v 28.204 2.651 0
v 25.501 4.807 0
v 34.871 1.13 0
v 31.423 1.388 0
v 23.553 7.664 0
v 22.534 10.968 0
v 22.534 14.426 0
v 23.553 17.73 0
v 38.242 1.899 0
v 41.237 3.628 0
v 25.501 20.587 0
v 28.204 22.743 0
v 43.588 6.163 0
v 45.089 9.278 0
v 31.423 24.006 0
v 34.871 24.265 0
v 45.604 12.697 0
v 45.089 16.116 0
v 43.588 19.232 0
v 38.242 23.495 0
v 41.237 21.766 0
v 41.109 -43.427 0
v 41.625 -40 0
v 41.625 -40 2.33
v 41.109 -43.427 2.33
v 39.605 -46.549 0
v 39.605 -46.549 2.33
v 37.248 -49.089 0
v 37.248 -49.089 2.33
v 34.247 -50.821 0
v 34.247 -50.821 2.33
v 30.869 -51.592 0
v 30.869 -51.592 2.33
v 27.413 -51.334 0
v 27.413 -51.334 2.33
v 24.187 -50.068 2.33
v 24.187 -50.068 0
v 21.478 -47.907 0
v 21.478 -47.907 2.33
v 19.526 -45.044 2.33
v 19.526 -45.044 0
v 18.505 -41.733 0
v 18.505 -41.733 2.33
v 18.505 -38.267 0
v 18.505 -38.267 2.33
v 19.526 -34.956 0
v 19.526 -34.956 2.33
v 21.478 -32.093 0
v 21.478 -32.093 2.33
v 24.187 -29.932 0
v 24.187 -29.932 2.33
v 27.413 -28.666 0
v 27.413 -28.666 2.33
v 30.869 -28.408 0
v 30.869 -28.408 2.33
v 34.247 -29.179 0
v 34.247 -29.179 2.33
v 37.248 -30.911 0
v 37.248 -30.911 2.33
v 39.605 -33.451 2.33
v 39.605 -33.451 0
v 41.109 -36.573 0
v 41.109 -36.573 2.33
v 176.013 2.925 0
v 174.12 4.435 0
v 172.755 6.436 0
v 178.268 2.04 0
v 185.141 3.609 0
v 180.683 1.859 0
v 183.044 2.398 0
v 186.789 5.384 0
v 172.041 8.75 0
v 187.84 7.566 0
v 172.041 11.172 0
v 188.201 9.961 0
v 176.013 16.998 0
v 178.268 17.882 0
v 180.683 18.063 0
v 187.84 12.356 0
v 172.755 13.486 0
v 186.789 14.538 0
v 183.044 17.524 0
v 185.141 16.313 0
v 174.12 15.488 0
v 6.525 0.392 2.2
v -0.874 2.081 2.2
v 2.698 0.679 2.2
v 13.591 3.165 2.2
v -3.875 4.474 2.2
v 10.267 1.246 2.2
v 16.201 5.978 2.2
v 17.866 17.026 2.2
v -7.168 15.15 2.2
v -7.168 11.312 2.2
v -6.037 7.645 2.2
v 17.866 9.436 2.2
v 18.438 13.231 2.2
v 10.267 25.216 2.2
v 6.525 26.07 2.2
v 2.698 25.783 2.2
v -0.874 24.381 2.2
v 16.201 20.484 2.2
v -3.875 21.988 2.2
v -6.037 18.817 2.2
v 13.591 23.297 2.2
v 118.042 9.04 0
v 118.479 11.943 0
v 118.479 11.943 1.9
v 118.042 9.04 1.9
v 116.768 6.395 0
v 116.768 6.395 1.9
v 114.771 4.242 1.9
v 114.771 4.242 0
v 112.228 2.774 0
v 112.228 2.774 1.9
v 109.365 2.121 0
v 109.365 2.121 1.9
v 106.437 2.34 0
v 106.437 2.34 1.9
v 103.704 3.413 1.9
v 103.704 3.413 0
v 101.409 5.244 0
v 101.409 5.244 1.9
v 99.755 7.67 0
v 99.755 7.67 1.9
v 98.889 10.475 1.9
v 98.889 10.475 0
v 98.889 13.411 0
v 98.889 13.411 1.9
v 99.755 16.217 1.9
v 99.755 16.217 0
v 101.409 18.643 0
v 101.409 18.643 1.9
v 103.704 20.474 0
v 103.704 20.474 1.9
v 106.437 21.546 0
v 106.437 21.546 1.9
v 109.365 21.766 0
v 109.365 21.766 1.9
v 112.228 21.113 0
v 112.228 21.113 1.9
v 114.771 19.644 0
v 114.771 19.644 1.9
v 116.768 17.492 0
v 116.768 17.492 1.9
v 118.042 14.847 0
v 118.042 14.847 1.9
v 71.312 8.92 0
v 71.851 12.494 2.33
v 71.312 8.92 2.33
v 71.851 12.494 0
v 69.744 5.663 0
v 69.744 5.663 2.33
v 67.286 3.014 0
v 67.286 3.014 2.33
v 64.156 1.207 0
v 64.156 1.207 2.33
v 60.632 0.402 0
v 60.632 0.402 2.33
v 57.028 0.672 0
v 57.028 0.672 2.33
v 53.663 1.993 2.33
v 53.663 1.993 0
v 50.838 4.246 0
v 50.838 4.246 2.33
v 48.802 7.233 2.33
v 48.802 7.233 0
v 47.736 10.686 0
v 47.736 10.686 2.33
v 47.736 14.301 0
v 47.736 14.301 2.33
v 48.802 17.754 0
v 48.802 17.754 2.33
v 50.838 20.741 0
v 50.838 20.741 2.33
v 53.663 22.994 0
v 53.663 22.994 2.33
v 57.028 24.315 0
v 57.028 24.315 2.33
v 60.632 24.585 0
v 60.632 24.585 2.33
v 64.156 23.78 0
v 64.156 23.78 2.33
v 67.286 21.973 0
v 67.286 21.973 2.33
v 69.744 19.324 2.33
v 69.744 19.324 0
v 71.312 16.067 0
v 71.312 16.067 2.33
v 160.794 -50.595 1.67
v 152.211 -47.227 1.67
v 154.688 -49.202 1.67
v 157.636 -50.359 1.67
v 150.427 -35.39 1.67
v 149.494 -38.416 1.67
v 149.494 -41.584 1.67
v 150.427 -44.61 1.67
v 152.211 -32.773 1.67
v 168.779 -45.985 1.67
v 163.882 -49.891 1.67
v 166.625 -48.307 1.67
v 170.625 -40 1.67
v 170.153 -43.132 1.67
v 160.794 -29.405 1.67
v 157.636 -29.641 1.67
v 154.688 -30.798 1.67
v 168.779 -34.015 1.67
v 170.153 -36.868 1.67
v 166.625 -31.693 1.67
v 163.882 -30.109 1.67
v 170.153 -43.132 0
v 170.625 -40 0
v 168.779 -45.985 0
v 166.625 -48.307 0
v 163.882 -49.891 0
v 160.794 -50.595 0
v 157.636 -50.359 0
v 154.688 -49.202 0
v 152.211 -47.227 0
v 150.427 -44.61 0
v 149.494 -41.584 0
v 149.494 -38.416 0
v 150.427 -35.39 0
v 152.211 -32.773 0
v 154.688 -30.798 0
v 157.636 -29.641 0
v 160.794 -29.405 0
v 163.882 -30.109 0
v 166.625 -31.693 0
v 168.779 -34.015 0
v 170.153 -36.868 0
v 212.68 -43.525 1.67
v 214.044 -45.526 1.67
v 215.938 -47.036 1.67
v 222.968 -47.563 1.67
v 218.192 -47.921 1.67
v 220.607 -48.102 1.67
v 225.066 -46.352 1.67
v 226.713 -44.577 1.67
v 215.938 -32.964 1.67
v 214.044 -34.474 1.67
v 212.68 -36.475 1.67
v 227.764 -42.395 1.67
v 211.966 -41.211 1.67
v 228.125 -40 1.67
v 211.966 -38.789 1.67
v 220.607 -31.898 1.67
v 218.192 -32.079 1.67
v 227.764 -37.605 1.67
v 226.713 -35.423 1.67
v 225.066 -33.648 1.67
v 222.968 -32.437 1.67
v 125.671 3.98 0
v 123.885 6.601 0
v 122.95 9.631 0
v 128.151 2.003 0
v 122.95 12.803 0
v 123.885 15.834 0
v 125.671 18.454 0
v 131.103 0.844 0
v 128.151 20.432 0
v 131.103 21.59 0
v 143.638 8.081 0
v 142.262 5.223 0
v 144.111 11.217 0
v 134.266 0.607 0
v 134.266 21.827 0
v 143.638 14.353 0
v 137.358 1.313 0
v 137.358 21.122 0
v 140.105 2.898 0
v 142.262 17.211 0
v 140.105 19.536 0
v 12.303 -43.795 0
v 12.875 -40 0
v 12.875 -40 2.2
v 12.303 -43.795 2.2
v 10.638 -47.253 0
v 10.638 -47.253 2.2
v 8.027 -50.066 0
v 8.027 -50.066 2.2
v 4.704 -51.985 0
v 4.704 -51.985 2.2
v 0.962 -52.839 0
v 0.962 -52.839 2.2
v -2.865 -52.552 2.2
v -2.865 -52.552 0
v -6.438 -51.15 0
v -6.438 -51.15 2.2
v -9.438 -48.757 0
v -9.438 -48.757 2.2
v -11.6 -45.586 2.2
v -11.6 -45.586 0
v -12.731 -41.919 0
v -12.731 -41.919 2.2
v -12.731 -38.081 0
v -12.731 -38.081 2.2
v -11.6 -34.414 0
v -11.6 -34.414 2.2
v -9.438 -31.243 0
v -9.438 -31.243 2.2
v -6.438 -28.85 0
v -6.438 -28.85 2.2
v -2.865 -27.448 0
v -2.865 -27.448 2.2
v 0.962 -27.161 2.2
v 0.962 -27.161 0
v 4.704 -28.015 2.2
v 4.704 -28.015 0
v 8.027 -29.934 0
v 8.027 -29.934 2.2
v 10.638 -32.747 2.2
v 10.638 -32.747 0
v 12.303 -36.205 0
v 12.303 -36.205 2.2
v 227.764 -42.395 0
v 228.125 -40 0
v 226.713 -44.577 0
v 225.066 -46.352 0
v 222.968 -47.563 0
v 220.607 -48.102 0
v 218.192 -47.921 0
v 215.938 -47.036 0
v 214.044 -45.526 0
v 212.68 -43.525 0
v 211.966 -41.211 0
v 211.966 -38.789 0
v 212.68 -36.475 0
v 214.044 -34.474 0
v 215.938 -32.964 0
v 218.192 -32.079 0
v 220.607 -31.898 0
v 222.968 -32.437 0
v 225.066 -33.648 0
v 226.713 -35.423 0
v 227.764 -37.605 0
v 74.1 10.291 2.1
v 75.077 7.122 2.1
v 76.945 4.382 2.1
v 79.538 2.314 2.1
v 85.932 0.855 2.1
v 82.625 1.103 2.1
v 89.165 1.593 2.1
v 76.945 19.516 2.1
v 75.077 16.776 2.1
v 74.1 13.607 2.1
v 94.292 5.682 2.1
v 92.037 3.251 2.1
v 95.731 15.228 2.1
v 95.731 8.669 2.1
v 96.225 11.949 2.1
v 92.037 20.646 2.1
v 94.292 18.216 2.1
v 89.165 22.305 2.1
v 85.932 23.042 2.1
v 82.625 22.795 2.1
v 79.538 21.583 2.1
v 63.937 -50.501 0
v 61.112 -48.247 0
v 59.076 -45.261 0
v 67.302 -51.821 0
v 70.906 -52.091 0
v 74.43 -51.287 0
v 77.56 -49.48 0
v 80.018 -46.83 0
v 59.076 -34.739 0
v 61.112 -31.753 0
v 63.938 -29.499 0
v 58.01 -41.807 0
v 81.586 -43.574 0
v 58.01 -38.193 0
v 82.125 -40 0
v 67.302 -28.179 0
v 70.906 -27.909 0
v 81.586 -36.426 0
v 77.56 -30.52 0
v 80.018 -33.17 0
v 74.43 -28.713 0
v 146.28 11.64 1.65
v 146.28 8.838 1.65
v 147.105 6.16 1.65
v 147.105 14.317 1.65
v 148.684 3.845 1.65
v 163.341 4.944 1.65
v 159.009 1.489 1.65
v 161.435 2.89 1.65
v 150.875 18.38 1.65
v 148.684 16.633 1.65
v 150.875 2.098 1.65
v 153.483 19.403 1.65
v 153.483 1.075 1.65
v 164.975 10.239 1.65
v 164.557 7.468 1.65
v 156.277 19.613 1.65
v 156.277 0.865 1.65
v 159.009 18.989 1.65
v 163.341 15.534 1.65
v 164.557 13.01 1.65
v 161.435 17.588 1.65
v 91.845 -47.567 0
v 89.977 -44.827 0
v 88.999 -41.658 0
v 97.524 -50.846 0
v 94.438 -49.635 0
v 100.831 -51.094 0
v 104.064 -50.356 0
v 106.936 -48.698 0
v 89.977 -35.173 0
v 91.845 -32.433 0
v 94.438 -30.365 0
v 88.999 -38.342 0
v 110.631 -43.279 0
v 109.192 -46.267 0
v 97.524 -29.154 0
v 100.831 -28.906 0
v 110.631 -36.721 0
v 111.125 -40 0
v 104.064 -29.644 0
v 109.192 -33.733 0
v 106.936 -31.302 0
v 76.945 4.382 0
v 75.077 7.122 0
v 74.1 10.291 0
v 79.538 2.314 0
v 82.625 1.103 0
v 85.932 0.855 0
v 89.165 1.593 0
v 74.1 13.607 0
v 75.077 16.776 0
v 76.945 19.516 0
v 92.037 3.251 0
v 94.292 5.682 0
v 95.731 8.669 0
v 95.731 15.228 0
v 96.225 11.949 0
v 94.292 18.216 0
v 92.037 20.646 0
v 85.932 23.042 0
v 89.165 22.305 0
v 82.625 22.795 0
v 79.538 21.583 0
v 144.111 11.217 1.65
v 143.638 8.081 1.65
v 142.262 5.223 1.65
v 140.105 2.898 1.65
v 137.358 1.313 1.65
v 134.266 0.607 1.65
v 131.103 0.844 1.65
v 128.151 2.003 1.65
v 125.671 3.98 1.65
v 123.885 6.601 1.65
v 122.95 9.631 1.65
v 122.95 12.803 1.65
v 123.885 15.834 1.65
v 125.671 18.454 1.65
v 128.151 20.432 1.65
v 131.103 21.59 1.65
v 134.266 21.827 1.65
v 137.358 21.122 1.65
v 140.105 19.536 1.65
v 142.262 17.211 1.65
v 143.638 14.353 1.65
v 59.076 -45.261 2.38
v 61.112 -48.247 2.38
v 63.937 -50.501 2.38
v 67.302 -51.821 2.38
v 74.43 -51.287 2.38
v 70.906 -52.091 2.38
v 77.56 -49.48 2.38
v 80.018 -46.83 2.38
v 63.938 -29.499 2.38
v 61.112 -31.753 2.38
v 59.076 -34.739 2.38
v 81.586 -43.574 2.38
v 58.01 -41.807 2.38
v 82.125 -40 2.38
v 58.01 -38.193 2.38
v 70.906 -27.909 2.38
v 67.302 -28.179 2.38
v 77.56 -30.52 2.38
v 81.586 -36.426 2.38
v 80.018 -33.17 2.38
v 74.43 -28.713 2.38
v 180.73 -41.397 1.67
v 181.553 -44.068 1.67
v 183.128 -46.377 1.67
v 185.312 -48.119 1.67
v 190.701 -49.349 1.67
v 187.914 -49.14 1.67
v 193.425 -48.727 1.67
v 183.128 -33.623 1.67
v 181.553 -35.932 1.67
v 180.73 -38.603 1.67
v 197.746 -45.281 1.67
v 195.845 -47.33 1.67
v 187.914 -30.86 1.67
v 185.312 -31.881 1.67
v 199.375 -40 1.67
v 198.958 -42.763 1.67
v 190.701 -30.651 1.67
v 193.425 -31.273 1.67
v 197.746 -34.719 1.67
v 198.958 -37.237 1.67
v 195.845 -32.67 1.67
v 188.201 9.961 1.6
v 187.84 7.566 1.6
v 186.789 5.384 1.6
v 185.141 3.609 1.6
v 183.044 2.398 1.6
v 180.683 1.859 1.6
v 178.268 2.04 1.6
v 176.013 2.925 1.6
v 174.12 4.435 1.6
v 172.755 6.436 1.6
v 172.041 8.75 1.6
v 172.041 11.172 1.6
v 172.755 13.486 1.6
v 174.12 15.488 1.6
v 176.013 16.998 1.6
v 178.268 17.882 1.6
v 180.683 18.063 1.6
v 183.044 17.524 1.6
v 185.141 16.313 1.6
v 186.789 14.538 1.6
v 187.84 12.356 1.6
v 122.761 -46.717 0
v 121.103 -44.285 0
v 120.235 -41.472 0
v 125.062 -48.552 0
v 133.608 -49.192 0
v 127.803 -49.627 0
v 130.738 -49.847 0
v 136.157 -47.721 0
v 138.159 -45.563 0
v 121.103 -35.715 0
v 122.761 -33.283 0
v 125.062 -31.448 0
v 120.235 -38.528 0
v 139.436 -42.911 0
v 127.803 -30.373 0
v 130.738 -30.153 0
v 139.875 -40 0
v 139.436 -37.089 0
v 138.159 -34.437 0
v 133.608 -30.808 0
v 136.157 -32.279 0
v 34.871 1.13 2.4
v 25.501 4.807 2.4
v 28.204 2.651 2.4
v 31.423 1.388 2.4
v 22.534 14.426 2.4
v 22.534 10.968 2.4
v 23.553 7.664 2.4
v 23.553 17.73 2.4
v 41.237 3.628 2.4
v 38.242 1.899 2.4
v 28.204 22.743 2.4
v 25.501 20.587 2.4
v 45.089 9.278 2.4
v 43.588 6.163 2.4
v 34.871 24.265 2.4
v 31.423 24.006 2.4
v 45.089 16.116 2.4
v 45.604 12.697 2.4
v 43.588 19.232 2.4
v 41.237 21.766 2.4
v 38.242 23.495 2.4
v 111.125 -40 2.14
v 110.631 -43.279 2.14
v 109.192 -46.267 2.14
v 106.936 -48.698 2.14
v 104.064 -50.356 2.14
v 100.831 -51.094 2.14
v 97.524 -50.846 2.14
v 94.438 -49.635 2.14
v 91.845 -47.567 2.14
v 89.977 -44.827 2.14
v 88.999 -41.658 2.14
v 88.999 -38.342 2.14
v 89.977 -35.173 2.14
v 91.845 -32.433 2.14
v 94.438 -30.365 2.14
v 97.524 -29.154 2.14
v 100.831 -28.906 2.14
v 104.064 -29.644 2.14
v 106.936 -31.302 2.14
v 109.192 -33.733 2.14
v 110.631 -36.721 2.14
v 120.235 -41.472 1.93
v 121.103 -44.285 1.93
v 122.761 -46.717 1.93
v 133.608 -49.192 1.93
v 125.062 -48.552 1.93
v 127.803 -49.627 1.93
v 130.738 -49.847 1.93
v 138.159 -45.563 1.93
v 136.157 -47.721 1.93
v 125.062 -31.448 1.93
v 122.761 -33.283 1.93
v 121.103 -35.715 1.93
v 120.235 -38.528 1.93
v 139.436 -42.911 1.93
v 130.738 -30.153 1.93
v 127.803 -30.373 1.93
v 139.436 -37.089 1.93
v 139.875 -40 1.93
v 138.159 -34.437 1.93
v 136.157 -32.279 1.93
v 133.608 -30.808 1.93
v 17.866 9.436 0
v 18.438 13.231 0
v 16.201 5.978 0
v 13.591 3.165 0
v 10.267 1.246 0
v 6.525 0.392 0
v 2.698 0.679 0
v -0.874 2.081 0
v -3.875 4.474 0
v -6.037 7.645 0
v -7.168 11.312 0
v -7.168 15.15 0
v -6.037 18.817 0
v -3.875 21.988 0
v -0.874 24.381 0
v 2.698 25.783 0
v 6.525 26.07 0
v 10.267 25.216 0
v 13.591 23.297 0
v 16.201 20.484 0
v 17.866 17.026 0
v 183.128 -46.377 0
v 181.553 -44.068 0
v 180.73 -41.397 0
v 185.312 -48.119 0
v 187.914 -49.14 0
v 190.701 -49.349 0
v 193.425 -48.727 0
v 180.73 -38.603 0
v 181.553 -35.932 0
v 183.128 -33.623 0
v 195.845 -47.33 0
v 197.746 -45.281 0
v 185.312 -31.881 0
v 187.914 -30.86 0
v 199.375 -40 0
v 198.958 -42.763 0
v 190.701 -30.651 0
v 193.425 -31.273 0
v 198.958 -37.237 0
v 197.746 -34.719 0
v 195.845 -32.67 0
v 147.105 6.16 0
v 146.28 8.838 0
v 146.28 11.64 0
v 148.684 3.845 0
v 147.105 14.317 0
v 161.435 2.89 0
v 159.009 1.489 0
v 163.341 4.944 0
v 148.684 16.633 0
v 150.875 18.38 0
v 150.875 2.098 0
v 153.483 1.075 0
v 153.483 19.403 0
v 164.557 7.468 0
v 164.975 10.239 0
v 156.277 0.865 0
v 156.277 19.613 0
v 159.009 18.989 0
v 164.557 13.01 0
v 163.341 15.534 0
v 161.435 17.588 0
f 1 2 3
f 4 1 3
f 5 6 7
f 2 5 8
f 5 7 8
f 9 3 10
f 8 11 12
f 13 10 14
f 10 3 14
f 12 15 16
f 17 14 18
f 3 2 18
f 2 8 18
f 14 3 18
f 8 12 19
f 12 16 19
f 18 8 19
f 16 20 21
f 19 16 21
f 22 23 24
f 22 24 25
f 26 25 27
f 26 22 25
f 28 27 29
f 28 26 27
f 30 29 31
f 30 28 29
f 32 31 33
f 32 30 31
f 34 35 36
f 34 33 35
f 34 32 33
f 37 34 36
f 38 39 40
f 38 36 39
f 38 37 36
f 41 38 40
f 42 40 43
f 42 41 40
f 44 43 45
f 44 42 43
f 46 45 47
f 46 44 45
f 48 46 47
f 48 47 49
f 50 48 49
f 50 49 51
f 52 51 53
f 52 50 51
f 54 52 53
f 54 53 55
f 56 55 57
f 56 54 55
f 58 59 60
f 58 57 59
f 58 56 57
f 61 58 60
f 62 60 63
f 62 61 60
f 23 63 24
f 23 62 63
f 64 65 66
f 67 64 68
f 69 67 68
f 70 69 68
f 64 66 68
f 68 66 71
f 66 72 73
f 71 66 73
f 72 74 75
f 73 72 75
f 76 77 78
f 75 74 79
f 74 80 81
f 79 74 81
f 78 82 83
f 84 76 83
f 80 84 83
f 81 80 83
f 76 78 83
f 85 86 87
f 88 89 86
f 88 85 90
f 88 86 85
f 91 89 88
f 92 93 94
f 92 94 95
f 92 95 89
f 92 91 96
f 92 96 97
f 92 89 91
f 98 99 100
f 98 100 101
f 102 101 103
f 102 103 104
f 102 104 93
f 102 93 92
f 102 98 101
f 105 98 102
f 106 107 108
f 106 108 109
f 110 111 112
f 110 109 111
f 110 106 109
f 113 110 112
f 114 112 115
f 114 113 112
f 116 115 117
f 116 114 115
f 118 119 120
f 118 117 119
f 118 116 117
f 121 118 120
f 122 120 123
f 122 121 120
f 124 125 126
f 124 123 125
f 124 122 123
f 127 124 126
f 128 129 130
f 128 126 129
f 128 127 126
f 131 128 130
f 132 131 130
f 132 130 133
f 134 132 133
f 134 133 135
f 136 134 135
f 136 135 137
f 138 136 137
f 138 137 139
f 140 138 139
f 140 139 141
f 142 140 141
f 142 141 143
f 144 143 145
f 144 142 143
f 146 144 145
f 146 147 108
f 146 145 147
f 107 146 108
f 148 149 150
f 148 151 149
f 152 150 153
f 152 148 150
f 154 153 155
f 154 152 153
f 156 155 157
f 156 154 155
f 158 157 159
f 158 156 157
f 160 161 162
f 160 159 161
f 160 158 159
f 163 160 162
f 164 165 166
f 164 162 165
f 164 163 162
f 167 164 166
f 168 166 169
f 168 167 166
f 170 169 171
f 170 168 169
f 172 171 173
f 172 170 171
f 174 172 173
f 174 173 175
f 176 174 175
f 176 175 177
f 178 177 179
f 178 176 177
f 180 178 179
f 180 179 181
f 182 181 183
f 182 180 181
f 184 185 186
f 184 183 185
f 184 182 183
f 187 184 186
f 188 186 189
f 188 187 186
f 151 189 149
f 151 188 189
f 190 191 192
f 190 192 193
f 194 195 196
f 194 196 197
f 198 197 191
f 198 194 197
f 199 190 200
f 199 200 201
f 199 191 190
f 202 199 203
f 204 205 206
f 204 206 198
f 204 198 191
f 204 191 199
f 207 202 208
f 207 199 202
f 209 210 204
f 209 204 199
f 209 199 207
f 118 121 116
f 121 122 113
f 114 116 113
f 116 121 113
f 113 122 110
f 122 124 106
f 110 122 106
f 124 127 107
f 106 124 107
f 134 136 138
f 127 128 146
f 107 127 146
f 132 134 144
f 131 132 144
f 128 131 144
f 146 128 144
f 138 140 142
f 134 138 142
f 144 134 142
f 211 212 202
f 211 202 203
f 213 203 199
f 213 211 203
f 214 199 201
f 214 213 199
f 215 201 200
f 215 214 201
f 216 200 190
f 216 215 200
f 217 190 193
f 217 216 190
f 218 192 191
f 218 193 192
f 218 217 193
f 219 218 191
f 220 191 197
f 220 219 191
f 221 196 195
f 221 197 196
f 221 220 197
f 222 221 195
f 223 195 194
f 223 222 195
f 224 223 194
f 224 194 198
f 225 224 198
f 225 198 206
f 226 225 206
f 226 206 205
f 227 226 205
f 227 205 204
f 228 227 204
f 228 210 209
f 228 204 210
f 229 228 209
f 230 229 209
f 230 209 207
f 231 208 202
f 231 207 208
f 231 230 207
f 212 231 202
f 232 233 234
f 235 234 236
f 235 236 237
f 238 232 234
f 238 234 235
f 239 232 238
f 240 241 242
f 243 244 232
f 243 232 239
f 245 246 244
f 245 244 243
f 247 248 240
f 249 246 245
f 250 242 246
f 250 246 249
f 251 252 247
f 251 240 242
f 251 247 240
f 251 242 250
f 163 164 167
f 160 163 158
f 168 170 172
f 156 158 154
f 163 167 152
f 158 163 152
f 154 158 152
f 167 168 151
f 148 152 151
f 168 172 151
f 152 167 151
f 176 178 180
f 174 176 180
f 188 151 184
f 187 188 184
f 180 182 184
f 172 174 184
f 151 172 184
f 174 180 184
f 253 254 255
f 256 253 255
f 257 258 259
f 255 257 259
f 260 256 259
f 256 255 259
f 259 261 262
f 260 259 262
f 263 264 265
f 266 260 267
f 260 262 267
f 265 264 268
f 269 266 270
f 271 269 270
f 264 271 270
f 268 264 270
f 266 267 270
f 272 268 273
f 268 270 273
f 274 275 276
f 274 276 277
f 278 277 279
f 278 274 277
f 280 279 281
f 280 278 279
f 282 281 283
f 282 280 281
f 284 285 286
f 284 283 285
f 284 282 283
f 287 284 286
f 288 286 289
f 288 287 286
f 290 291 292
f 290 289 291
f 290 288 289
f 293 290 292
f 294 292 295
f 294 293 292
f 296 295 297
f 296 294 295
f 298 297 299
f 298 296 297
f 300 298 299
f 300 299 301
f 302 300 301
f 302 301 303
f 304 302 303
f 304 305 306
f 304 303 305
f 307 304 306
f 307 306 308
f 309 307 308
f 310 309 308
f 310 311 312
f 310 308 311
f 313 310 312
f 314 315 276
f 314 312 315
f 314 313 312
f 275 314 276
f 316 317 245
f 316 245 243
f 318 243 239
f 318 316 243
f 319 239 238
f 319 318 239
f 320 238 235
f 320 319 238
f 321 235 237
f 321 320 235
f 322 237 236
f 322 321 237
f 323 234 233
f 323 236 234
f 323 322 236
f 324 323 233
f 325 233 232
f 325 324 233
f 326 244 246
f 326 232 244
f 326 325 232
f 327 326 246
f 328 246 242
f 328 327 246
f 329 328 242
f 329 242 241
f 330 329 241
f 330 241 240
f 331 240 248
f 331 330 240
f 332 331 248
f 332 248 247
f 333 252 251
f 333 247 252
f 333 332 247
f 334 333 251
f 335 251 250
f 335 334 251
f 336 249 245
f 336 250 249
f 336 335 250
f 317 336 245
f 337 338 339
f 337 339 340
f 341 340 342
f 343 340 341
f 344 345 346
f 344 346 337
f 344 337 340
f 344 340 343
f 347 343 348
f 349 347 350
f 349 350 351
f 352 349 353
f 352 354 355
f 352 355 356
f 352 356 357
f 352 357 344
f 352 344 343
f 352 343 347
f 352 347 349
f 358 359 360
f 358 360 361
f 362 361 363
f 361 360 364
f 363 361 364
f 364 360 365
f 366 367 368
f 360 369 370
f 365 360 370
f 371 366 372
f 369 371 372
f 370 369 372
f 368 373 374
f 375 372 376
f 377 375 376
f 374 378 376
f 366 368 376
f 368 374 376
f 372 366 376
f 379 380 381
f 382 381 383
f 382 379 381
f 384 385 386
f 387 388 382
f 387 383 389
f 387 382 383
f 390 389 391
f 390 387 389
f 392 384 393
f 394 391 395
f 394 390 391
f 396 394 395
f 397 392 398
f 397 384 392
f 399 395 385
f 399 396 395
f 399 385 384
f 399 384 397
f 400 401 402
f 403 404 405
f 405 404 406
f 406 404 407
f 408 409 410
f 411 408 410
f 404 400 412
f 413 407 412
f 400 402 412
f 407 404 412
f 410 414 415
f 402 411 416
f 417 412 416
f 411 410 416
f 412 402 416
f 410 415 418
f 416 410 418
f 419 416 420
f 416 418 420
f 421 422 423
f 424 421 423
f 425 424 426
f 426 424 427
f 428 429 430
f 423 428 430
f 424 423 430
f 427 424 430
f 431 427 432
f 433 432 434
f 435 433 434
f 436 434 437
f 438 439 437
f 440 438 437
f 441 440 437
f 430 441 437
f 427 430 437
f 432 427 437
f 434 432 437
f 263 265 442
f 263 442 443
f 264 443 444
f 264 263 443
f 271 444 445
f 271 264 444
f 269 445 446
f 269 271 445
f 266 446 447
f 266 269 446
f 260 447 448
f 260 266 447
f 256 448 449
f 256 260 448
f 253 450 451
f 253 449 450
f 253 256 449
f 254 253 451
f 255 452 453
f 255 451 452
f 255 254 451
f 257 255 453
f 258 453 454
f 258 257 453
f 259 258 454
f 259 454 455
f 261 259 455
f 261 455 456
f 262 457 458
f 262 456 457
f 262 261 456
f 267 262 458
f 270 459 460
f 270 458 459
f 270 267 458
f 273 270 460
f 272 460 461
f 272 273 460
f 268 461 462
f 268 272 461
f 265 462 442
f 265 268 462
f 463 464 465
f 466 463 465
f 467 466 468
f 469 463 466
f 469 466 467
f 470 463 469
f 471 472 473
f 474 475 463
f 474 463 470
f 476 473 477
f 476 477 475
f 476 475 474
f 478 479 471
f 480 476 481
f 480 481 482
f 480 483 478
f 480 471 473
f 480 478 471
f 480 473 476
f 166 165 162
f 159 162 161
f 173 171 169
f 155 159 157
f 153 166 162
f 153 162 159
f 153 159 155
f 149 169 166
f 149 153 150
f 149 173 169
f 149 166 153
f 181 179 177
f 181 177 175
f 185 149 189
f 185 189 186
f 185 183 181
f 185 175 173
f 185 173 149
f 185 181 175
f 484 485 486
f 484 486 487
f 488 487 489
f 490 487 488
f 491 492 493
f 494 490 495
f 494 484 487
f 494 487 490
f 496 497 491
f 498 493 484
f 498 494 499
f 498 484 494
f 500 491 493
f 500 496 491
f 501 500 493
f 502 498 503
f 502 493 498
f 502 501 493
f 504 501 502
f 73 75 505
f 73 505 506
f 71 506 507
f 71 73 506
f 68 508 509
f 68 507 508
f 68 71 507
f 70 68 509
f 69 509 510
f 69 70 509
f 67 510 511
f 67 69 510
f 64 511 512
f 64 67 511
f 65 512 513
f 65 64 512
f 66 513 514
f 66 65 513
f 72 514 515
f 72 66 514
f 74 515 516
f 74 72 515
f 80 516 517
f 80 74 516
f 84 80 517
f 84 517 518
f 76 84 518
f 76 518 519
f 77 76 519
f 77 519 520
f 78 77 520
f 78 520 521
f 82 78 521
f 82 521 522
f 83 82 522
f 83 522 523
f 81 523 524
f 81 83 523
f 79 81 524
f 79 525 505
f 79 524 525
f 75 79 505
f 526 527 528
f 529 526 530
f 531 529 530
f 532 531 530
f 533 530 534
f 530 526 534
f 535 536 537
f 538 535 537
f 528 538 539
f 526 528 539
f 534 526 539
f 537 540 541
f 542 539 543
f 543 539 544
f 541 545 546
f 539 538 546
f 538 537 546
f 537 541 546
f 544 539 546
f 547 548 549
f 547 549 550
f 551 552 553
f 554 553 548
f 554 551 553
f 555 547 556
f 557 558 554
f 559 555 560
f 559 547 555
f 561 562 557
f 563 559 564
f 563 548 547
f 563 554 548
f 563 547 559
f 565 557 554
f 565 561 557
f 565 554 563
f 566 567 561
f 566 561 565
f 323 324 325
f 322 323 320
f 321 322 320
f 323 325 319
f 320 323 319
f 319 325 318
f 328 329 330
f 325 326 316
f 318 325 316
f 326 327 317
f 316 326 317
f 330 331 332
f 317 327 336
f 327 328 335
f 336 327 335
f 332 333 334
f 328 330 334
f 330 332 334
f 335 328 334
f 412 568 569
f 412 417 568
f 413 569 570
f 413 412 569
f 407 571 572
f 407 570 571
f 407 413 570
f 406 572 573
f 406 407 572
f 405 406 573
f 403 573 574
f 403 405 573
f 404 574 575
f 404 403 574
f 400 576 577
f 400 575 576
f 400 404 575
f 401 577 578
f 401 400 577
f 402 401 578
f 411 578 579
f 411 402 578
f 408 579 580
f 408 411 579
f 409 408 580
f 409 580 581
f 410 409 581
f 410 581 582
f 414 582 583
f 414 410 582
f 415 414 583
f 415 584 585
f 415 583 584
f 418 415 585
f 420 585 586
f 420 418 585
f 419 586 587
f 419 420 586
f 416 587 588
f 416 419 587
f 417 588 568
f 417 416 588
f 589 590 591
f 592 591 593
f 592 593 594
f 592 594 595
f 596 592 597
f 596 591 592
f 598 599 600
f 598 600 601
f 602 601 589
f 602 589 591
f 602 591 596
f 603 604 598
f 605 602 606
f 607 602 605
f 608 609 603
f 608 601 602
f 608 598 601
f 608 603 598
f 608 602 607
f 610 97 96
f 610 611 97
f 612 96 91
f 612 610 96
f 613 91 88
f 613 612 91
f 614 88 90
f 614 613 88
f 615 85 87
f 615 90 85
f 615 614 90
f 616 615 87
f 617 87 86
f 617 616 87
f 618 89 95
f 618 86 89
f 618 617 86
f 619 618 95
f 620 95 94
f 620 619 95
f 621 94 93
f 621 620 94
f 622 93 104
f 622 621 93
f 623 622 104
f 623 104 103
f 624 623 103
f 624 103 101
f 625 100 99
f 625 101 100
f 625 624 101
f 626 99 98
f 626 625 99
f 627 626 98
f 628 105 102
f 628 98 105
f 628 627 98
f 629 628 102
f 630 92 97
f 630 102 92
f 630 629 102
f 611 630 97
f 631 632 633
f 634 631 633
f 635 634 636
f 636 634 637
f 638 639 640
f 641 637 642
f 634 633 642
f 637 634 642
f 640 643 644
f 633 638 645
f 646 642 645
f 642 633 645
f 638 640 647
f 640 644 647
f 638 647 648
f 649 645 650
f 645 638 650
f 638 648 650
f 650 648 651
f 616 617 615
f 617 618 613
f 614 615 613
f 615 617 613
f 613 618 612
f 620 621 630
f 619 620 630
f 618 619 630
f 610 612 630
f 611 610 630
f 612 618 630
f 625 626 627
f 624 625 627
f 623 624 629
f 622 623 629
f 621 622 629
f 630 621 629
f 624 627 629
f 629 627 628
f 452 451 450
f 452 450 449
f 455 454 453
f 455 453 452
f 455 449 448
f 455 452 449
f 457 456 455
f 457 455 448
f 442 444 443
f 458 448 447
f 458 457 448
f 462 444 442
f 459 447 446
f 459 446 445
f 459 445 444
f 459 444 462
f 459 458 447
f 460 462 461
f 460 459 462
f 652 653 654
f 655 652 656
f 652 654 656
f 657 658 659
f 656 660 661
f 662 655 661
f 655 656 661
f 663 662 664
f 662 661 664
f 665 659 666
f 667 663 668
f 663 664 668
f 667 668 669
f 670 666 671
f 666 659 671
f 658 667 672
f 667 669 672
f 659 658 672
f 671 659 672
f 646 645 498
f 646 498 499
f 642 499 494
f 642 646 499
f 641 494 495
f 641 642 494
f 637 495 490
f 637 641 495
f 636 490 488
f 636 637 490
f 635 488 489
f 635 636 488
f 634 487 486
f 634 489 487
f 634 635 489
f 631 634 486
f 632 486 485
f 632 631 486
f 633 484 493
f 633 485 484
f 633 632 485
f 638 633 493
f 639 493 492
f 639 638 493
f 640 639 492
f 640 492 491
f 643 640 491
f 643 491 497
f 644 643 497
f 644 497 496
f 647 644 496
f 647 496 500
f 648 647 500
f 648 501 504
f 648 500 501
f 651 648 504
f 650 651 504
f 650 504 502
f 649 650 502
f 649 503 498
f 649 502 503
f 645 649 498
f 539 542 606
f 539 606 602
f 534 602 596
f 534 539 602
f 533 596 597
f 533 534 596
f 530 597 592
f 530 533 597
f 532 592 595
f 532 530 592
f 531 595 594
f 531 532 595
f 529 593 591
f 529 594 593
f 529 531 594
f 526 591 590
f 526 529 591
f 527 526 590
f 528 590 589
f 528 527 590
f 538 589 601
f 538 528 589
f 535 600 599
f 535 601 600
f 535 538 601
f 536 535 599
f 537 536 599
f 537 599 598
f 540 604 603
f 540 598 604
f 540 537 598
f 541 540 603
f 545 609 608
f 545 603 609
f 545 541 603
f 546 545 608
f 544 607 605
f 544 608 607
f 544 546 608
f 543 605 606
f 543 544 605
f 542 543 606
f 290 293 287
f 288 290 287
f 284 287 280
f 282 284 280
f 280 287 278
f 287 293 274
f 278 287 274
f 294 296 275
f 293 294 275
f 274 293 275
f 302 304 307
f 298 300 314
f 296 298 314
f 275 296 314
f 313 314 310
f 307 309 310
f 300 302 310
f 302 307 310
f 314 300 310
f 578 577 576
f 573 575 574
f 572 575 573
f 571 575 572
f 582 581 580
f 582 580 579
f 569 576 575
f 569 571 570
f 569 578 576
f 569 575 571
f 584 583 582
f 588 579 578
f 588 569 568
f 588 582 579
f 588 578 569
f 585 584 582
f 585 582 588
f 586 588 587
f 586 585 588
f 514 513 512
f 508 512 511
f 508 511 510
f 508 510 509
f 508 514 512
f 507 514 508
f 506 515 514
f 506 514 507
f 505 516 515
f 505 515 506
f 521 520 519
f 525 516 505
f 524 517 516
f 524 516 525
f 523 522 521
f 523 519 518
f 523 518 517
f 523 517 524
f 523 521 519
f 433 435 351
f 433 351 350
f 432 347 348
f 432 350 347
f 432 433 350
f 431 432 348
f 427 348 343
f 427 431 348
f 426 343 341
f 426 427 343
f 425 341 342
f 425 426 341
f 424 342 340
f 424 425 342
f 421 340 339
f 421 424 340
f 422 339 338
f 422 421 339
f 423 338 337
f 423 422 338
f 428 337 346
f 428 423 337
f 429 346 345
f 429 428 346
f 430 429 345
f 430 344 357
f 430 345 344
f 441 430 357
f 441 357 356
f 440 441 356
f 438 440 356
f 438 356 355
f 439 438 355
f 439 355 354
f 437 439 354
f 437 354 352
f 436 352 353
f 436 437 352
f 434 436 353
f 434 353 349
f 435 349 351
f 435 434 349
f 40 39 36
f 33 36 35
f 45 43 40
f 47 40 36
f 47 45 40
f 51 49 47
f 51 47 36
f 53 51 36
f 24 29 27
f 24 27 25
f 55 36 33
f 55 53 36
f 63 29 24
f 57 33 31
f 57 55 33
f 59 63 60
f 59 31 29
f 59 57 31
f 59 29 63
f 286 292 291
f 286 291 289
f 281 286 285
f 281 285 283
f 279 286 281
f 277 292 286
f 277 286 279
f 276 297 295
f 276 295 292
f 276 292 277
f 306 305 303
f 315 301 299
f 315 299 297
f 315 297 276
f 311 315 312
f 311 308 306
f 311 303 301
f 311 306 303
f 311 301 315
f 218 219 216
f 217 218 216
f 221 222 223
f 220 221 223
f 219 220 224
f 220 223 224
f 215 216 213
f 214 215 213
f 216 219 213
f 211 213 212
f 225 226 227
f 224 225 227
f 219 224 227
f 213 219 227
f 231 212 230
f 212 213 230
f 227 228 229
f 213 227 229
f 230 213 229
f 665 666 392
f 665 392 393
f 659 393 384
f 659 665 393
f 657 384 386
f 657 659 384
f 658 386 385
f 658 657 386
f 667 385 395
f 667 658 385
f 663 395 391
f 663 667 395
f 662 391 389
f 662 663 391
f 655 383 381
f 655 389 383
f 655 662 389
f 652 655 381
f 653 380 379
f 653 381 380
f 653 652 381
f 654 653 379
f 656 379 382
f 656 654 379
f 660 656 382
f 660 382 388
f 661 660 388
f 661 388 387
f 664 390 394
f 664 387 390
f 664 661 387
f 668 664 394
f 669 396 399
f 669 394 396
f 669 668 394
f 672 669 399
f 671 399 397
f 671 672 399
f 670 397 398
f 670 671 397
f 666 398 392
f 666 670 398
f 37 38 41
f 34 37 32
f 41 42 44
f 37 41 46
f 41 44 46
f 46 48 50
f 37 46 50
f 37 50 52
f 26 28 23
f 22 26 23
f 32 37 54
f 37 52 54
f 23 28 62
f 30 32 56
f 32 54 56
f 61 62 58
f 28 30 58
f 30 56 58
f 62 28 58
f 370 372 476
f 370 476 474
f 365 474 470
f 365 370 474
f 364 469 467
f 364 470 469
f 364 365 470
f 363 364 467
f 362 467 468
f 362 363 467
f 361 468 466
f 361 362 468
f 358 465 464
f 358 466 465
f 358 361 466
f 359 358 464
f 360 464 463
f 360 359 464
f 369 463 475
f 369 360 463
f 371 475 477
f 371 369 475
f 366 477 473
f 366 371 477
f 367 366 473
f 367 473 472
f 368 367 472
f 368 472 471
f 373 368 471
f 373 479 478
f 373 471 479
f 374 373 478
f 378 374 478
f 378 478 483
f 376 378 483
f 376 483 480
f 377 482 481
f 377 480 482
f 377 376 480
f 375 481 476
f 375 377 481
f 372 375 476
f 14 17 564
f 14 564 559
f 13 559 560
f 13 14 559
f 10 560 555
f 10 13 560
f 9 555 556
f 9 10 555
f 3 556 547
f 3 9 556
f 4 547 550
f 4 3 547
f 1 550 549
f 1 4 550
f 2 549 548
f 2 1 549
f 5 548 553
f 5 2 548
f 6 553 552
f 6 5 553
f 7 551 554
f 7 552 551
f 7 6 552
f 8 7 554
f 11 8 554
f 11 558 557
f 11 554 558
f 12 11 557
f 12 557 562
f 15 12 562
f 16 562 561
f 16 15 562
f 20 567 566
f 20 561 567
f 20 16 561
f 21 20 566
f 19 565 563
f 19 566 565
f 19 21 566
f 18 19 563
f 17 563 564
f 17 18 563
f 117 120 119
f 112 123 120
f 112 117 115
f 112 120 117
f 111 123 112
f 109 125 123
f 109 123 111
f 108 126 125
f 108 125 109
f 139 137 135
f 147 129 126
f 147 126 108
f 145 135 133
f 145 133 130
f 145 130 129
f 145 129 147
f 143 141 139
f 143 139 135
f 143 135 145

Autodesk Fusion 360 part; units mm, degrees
sketch "Esquisse1" plane through (0, 0, 0) normal (0, 0, 1) x (1, 0, 0)
  circle A0 centre (5.5632, 13.2312) radius 12.875
  circle A1 centre (34.0041, 12.6972) radius 11.6
  circle A2 centre (59.7259, 12.4935) radius 12.125
  circle A3 centre (85.1004, 11.9486) radius 11.125
  circle A4 centre (108.6293, 11.9434) radius 9.85
  circle A5 centre (133.4711, 11.2171) radius 10.64
  circle A6 centre (155.5746, 10.2389) radius 9.4
  circle A7 centre (180.0756, 9.9611) radius 8.125
  circle A8 centre (0, -40) radius 12.875
  circle A9 centre (30, -40) radius 11.625
  circle A10 centre (70, -40) radius 12.125
  circle A11 centre (100, -40) radius 11.125
  circle A12 centre (130, -40) radius 9.875
  circle A13 centre (160, -40) radius 10.625
  circle A14 centre (190, -40) radius 9.375
  circle A15 centre (220, -40) radius 8.125
  dimension "d1" = 25.75
  dimension "d2" = 23.2
  dimension "d3" = 24.25
  dimension "d4" = 22.25
  dimension "d5" = 19.7
  dimension "d6" = 21.28
  dimension "d7" = 18.8
  dimension "d8" = 16.25
  dimension "d25" = 25.75
  dimension "d26" = 23.25
  dimension "d27" = 24.25
  dimension "d28" = 22.25
  dimension "d29" = 19.75
  dimension "d30" = 21.25
  dimension "d31" = 18.75
  dimension "d32" = 16.25
extrude "Extrusion1" add sketch "Esquisse1" along normal blind 2.2 contours A0 makes body 1
extrude "Extrusion2" add sketch "Esquisse1" along normal blind 2.4 separate body contours A1 makes body 2
extrude "Extrusion3" add sketch "Esquisse1" along normal blind 2.33 separate body contours A2 makes body 3
extrude "Extrusion4" add sketch "Esquisse1" along normal blind 2.1 separate body contours A3 makes body 4
extrude "Extrusion5" add sketch "Esquisse1" along normal blind 1.9 separate body contours A4 makes body 5
extrude "Extrusion6" add sketch "Esquisse1" along normal blind 1.65 separate body contours A5 makes body 6
extrude "Extrusion7" add sketch "Esquisse1" along normal blind 1.65 separate body contours A6 makes body 7
extrude "Extrusion8" add sketch "Esquisse1" along normal blind 1.6 separate body contours A7 makes body 8
extrude "Extrusion9" add sketch "Esquisse1" along normal blind 1.67 separate body contours A15 makes body 9
extrude "Extrusion10" add sketch "Esquisse1" along normal blind 1.67 separate body contours A14 makes body 10
extrude "Extrusion11" add sketch "Esquisse1" along normal blind 1.67 separate body contours A13 makes body 11
extrude "Extrusion12" add sketch "Esquisse1" along normal blind 1.93 separate body contours A12 makes body 12
extrude "Extrusion13" add sketch "Esquisse1" along normal blind 2.14 separate body contours A11 makes body 13
extrude "Extrusion14" add sketch "Esquisse1" along normal blind 2.38 separate body contours A10 makes body 14
extrude "Extrusion15" add sketch "Esquisse1" along normal blind 2.33 separate body contours A9 makes body 15
extrude "Extrusion16" add sketch "Esquisse1" along normal blind 2.2 separate body contours A8 makes body 16
sketch "Esquisse2" plane through (0, 0, 0) normal (0, 0, 1) x (1, 0, 0)
